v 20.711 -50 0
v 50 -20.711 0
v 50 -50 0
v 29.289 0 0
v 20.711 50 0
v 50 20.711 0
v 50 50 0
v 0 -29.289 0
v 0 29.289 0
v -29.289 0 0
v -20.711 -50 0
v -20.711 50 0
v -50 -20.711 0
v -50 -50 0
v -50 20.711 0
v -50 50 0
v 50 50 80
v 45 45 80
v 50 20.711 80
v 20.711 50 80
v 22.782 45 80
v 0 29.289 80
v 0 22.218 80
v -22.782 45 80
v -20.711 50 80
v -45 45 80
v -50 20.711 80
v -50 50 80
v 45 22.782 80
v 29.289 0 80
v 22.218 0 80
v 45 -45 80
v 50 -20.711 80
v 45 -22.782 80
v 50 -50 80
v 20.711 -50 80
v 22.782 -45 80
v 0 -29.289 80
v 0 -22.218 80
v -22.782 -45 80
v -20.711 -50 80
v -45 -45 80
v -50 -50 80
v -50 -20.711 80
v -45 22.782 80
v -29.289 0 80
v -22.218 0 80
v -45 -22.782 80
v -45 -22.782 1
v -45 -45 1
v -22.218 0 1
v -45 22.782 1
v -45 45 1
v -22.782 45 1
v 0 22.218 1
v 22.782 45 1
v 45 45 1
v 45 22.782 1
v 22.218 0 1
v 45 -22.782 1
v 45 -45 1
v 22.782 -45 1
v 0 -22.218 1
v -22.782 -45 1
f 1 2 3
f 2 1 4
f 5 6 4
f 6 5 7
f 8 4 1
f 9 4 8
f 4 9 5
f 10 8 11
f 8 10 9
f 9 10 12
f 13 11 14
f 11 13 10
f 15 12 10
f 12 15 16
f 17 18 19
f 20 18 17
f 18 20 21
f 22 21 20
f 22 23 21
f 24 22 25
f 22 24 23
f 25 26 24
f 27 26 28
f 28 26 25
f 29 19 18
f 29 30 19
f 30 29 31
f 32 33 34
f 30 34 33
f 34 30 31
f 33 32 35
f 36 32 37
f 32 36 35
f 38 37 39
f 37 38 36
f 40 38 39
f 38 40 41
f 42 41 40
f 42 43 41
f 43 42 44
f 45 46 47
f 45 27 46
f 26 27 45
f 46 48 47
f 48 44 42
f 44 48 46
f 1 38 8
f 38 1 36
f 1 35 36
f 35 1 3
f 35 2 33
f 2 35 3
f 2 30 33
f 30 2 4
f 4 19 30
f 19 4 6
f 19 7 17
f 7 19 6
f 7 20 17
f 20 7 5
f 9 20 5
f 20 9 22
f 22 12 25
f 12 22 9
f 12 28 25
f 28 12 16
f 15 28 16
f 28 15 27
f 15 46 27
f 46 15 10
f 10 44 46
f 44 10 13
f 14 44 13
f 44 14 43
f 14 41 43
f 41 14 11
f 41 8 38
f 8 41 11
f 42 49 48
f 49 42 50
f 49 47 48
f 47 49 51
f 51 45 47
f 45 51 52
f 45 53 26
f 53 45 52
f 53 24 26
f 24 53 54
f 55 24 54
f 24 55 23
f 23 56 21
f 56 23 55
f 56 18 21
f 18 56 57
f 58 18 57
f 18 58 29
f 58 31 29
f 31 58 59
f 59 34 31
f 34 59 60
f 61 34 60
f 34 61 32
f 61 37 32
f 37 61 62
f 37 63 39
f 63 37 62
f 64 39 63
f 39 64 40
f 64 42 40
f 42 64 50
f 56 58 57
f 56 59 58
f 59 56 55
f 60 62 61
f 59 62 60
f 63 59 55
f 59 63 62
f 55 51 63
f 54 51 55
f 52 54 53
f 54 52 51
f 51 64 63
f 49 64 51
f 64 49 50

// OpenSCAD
/*
 koch snowflakes and anti snowflakes
 
 This version is based on a square with replaced sides using a 45 90 45 triangle
 
 the curve and its anti-curve ( mirrored side) tesselate
 
 only up to order 4 since recursion breaks at higher orders
 higher orders are not practical for making anyway , even 4 probably isnt 
 
*/
// side length of base square
side=100;
// order of outer koch curve 0 to 4 
outer_order=1;
//parity of outer curve 0 for curve , 1 for anti-curve
outer_parity=1;
// wall thickness  - 0 if scaled
thickness=5;
// or scaled version
reduce=0.8;
// order of inner snowflake  0 to 4 
inner_order=1;
//parity of inner curve 0 for curve , 1 for anti-curve
inner_parity=1;
// extrude height 0 = no extrusion for laser cutting
height=80;
// height of base formed by outer to create a vase
base_height=1;

function r_peri(peri,sides,n,i=0) =
  i<n 
    ? r_peri(replace_sides(peri,sides),sides,n,i+1)
    : peri ;

sq = scale_peri(norm_peri([90,90,90,90]),side);
sides= [norm_peri([225,90,225,90]), 
       norm_peri([135,270,135,90])];
outer = r_peri(sq,[sides[outer_parity]],outer_order);
inner = r_peri(sq,[sides[inner_parity]],inner_order);
    
module outline(outer,inner) {
    outer_tile=centre_tile(peri_to_tile(outer));
    inner_tile=
       thickness >0 
         ? inset_tile(centre_tile(peri_to_tile(inner)),thickness)
         : centre_tile(peri_to_tile(scale_peri(inner,reduce)));
    difference() {
         fill_tile(outer_tile);
         fill_tile(inner_tile);
    }
}  
  
if (height > 0)
    linear_extrude(height=height)
      outline(outer,inner);
else 
    outline(outer,inner);
// extracts from tiling library

if (base_height >0)
    linear_extrude(height=base_height)
       fill_tile(centre_tile(peri_to_tile(outer)));  

module fill_tile(tile,col="red") {
    color(col)
       polygon(3d_to_2d(tile)); 
};
 // functions
 
function replace_sides(peri,sides) =
 flatten( [for (i=[0:len(peri)-1])
      let (bside = peri[i])
      let (mside =  sides[i % len(sides)])
      let (mside_m = 
              len(mside) >1 
                 ? concat([for (i=[0:len(mside)-2]) mside[i]],[[mside[len(mside)-1][0],bside[1]]])
                 : [[mside[0][0],bside[1]]]
           )
      let (mside_length = peri_error(mside_m))
      let (mside_scaled = scale_peri(mside_m,bside[0]/mside_length))
      mside_scaled
  ]);

function peri_to_points(peri,pos=[0,0,0],dir=0,i=0) =
    i == len(peri)
      ? [pos]
      : let (side = peri[i])
        let (distance = side[0])
        let (newpos = pos + distance* [cos(dir), sin(dir),0])
        let (angle = side[1])
        let (newdir = dir + (180 - angle))
        concat([pos],peri_to_points(peri,newpos,newdir,i+1)) 
     ;                 

function peri_to_tile(peri,last=false) = 
    let (p = peri_to_points(norm_peri(peri)))  
    last 
       ? [for (i=[0:len(p)-1]) p[i]] 
       : [for (i=[0:len(p)-2]) p[i]]; 

function norm_peri(peri) =
     [for (p=peri)
        len(p)==undef
           ? [1,p]
           :[p.x,p.y] 
     ];
function repeat_peri(p,n) =
   norm_peri( flatten([for (i=[0:n-1]) p]));
    
function scale_peri(peri,scale) =
   [for (p=peri)
        len(p)==undef
           ? [scale,p]
           :[scale * p[0],p[1]] 
   ];
   
function peri_error(peri) = 
    norm(peri_end(peri));

function peri_end(peri) =
    let(t=peri_to_tile(peri,true))
    t[len(t)-1];    
  
function translate_tile(t,d) =
      [for (p=t) p+d]; 
        
function centre_tile(t) =
    let(c = v_avg(t))
    translate_tile(t,-c);

function inset_tile (tile, d=0.1) =
  [for (i=[0:len(tile)-1])
      let (v1 = unitv(tile[(i+len(tile) - 1 )% len(tile)] - tile[i]))
      let (v2 = unitv(tile[i] - tile[(i+1 )% len(tile)] ))
      let (vm = unitv((v1 - v2) /2))
      let (a = 180 - angle_between(v1,v2))
      let (offset = d / sin(a/2))
      tile[i]+offset * vm
  ];
  
 function angle_between(u, v) = 
     let (x= unitv(u) * unitv(v))
     let (y = x <= -1 ? -1 :x >= 1 ? 1 : x)
     let (a = acos(y))
     let (d = cross(u,v).z)
      d  > 0 ? a : 360- a;
  
function unitv(v)=  
   let (n = norm(v))
   n !=0 ? v/ norm(v) : v;
  
function 3d_to_2d(points)=
    [ for (p=points) [p.x,p.y]];
function v_avg(v) =v_sum(v) / len(v);
      
function zero(v) =
    len(v) == undef ? 0 : [for (i=[0:len(v)-1]) 0];
        
function v_sum_r(v,n,k) =
      k < n ?  v[k] + v_sum_r(v,n,k+1) : zero(v[0]) ;

function v_sum(v) = v_sum_r(v,len(v),0);
      
function flatten(l) = [ for (a = l) for (b = a) b ] ;
